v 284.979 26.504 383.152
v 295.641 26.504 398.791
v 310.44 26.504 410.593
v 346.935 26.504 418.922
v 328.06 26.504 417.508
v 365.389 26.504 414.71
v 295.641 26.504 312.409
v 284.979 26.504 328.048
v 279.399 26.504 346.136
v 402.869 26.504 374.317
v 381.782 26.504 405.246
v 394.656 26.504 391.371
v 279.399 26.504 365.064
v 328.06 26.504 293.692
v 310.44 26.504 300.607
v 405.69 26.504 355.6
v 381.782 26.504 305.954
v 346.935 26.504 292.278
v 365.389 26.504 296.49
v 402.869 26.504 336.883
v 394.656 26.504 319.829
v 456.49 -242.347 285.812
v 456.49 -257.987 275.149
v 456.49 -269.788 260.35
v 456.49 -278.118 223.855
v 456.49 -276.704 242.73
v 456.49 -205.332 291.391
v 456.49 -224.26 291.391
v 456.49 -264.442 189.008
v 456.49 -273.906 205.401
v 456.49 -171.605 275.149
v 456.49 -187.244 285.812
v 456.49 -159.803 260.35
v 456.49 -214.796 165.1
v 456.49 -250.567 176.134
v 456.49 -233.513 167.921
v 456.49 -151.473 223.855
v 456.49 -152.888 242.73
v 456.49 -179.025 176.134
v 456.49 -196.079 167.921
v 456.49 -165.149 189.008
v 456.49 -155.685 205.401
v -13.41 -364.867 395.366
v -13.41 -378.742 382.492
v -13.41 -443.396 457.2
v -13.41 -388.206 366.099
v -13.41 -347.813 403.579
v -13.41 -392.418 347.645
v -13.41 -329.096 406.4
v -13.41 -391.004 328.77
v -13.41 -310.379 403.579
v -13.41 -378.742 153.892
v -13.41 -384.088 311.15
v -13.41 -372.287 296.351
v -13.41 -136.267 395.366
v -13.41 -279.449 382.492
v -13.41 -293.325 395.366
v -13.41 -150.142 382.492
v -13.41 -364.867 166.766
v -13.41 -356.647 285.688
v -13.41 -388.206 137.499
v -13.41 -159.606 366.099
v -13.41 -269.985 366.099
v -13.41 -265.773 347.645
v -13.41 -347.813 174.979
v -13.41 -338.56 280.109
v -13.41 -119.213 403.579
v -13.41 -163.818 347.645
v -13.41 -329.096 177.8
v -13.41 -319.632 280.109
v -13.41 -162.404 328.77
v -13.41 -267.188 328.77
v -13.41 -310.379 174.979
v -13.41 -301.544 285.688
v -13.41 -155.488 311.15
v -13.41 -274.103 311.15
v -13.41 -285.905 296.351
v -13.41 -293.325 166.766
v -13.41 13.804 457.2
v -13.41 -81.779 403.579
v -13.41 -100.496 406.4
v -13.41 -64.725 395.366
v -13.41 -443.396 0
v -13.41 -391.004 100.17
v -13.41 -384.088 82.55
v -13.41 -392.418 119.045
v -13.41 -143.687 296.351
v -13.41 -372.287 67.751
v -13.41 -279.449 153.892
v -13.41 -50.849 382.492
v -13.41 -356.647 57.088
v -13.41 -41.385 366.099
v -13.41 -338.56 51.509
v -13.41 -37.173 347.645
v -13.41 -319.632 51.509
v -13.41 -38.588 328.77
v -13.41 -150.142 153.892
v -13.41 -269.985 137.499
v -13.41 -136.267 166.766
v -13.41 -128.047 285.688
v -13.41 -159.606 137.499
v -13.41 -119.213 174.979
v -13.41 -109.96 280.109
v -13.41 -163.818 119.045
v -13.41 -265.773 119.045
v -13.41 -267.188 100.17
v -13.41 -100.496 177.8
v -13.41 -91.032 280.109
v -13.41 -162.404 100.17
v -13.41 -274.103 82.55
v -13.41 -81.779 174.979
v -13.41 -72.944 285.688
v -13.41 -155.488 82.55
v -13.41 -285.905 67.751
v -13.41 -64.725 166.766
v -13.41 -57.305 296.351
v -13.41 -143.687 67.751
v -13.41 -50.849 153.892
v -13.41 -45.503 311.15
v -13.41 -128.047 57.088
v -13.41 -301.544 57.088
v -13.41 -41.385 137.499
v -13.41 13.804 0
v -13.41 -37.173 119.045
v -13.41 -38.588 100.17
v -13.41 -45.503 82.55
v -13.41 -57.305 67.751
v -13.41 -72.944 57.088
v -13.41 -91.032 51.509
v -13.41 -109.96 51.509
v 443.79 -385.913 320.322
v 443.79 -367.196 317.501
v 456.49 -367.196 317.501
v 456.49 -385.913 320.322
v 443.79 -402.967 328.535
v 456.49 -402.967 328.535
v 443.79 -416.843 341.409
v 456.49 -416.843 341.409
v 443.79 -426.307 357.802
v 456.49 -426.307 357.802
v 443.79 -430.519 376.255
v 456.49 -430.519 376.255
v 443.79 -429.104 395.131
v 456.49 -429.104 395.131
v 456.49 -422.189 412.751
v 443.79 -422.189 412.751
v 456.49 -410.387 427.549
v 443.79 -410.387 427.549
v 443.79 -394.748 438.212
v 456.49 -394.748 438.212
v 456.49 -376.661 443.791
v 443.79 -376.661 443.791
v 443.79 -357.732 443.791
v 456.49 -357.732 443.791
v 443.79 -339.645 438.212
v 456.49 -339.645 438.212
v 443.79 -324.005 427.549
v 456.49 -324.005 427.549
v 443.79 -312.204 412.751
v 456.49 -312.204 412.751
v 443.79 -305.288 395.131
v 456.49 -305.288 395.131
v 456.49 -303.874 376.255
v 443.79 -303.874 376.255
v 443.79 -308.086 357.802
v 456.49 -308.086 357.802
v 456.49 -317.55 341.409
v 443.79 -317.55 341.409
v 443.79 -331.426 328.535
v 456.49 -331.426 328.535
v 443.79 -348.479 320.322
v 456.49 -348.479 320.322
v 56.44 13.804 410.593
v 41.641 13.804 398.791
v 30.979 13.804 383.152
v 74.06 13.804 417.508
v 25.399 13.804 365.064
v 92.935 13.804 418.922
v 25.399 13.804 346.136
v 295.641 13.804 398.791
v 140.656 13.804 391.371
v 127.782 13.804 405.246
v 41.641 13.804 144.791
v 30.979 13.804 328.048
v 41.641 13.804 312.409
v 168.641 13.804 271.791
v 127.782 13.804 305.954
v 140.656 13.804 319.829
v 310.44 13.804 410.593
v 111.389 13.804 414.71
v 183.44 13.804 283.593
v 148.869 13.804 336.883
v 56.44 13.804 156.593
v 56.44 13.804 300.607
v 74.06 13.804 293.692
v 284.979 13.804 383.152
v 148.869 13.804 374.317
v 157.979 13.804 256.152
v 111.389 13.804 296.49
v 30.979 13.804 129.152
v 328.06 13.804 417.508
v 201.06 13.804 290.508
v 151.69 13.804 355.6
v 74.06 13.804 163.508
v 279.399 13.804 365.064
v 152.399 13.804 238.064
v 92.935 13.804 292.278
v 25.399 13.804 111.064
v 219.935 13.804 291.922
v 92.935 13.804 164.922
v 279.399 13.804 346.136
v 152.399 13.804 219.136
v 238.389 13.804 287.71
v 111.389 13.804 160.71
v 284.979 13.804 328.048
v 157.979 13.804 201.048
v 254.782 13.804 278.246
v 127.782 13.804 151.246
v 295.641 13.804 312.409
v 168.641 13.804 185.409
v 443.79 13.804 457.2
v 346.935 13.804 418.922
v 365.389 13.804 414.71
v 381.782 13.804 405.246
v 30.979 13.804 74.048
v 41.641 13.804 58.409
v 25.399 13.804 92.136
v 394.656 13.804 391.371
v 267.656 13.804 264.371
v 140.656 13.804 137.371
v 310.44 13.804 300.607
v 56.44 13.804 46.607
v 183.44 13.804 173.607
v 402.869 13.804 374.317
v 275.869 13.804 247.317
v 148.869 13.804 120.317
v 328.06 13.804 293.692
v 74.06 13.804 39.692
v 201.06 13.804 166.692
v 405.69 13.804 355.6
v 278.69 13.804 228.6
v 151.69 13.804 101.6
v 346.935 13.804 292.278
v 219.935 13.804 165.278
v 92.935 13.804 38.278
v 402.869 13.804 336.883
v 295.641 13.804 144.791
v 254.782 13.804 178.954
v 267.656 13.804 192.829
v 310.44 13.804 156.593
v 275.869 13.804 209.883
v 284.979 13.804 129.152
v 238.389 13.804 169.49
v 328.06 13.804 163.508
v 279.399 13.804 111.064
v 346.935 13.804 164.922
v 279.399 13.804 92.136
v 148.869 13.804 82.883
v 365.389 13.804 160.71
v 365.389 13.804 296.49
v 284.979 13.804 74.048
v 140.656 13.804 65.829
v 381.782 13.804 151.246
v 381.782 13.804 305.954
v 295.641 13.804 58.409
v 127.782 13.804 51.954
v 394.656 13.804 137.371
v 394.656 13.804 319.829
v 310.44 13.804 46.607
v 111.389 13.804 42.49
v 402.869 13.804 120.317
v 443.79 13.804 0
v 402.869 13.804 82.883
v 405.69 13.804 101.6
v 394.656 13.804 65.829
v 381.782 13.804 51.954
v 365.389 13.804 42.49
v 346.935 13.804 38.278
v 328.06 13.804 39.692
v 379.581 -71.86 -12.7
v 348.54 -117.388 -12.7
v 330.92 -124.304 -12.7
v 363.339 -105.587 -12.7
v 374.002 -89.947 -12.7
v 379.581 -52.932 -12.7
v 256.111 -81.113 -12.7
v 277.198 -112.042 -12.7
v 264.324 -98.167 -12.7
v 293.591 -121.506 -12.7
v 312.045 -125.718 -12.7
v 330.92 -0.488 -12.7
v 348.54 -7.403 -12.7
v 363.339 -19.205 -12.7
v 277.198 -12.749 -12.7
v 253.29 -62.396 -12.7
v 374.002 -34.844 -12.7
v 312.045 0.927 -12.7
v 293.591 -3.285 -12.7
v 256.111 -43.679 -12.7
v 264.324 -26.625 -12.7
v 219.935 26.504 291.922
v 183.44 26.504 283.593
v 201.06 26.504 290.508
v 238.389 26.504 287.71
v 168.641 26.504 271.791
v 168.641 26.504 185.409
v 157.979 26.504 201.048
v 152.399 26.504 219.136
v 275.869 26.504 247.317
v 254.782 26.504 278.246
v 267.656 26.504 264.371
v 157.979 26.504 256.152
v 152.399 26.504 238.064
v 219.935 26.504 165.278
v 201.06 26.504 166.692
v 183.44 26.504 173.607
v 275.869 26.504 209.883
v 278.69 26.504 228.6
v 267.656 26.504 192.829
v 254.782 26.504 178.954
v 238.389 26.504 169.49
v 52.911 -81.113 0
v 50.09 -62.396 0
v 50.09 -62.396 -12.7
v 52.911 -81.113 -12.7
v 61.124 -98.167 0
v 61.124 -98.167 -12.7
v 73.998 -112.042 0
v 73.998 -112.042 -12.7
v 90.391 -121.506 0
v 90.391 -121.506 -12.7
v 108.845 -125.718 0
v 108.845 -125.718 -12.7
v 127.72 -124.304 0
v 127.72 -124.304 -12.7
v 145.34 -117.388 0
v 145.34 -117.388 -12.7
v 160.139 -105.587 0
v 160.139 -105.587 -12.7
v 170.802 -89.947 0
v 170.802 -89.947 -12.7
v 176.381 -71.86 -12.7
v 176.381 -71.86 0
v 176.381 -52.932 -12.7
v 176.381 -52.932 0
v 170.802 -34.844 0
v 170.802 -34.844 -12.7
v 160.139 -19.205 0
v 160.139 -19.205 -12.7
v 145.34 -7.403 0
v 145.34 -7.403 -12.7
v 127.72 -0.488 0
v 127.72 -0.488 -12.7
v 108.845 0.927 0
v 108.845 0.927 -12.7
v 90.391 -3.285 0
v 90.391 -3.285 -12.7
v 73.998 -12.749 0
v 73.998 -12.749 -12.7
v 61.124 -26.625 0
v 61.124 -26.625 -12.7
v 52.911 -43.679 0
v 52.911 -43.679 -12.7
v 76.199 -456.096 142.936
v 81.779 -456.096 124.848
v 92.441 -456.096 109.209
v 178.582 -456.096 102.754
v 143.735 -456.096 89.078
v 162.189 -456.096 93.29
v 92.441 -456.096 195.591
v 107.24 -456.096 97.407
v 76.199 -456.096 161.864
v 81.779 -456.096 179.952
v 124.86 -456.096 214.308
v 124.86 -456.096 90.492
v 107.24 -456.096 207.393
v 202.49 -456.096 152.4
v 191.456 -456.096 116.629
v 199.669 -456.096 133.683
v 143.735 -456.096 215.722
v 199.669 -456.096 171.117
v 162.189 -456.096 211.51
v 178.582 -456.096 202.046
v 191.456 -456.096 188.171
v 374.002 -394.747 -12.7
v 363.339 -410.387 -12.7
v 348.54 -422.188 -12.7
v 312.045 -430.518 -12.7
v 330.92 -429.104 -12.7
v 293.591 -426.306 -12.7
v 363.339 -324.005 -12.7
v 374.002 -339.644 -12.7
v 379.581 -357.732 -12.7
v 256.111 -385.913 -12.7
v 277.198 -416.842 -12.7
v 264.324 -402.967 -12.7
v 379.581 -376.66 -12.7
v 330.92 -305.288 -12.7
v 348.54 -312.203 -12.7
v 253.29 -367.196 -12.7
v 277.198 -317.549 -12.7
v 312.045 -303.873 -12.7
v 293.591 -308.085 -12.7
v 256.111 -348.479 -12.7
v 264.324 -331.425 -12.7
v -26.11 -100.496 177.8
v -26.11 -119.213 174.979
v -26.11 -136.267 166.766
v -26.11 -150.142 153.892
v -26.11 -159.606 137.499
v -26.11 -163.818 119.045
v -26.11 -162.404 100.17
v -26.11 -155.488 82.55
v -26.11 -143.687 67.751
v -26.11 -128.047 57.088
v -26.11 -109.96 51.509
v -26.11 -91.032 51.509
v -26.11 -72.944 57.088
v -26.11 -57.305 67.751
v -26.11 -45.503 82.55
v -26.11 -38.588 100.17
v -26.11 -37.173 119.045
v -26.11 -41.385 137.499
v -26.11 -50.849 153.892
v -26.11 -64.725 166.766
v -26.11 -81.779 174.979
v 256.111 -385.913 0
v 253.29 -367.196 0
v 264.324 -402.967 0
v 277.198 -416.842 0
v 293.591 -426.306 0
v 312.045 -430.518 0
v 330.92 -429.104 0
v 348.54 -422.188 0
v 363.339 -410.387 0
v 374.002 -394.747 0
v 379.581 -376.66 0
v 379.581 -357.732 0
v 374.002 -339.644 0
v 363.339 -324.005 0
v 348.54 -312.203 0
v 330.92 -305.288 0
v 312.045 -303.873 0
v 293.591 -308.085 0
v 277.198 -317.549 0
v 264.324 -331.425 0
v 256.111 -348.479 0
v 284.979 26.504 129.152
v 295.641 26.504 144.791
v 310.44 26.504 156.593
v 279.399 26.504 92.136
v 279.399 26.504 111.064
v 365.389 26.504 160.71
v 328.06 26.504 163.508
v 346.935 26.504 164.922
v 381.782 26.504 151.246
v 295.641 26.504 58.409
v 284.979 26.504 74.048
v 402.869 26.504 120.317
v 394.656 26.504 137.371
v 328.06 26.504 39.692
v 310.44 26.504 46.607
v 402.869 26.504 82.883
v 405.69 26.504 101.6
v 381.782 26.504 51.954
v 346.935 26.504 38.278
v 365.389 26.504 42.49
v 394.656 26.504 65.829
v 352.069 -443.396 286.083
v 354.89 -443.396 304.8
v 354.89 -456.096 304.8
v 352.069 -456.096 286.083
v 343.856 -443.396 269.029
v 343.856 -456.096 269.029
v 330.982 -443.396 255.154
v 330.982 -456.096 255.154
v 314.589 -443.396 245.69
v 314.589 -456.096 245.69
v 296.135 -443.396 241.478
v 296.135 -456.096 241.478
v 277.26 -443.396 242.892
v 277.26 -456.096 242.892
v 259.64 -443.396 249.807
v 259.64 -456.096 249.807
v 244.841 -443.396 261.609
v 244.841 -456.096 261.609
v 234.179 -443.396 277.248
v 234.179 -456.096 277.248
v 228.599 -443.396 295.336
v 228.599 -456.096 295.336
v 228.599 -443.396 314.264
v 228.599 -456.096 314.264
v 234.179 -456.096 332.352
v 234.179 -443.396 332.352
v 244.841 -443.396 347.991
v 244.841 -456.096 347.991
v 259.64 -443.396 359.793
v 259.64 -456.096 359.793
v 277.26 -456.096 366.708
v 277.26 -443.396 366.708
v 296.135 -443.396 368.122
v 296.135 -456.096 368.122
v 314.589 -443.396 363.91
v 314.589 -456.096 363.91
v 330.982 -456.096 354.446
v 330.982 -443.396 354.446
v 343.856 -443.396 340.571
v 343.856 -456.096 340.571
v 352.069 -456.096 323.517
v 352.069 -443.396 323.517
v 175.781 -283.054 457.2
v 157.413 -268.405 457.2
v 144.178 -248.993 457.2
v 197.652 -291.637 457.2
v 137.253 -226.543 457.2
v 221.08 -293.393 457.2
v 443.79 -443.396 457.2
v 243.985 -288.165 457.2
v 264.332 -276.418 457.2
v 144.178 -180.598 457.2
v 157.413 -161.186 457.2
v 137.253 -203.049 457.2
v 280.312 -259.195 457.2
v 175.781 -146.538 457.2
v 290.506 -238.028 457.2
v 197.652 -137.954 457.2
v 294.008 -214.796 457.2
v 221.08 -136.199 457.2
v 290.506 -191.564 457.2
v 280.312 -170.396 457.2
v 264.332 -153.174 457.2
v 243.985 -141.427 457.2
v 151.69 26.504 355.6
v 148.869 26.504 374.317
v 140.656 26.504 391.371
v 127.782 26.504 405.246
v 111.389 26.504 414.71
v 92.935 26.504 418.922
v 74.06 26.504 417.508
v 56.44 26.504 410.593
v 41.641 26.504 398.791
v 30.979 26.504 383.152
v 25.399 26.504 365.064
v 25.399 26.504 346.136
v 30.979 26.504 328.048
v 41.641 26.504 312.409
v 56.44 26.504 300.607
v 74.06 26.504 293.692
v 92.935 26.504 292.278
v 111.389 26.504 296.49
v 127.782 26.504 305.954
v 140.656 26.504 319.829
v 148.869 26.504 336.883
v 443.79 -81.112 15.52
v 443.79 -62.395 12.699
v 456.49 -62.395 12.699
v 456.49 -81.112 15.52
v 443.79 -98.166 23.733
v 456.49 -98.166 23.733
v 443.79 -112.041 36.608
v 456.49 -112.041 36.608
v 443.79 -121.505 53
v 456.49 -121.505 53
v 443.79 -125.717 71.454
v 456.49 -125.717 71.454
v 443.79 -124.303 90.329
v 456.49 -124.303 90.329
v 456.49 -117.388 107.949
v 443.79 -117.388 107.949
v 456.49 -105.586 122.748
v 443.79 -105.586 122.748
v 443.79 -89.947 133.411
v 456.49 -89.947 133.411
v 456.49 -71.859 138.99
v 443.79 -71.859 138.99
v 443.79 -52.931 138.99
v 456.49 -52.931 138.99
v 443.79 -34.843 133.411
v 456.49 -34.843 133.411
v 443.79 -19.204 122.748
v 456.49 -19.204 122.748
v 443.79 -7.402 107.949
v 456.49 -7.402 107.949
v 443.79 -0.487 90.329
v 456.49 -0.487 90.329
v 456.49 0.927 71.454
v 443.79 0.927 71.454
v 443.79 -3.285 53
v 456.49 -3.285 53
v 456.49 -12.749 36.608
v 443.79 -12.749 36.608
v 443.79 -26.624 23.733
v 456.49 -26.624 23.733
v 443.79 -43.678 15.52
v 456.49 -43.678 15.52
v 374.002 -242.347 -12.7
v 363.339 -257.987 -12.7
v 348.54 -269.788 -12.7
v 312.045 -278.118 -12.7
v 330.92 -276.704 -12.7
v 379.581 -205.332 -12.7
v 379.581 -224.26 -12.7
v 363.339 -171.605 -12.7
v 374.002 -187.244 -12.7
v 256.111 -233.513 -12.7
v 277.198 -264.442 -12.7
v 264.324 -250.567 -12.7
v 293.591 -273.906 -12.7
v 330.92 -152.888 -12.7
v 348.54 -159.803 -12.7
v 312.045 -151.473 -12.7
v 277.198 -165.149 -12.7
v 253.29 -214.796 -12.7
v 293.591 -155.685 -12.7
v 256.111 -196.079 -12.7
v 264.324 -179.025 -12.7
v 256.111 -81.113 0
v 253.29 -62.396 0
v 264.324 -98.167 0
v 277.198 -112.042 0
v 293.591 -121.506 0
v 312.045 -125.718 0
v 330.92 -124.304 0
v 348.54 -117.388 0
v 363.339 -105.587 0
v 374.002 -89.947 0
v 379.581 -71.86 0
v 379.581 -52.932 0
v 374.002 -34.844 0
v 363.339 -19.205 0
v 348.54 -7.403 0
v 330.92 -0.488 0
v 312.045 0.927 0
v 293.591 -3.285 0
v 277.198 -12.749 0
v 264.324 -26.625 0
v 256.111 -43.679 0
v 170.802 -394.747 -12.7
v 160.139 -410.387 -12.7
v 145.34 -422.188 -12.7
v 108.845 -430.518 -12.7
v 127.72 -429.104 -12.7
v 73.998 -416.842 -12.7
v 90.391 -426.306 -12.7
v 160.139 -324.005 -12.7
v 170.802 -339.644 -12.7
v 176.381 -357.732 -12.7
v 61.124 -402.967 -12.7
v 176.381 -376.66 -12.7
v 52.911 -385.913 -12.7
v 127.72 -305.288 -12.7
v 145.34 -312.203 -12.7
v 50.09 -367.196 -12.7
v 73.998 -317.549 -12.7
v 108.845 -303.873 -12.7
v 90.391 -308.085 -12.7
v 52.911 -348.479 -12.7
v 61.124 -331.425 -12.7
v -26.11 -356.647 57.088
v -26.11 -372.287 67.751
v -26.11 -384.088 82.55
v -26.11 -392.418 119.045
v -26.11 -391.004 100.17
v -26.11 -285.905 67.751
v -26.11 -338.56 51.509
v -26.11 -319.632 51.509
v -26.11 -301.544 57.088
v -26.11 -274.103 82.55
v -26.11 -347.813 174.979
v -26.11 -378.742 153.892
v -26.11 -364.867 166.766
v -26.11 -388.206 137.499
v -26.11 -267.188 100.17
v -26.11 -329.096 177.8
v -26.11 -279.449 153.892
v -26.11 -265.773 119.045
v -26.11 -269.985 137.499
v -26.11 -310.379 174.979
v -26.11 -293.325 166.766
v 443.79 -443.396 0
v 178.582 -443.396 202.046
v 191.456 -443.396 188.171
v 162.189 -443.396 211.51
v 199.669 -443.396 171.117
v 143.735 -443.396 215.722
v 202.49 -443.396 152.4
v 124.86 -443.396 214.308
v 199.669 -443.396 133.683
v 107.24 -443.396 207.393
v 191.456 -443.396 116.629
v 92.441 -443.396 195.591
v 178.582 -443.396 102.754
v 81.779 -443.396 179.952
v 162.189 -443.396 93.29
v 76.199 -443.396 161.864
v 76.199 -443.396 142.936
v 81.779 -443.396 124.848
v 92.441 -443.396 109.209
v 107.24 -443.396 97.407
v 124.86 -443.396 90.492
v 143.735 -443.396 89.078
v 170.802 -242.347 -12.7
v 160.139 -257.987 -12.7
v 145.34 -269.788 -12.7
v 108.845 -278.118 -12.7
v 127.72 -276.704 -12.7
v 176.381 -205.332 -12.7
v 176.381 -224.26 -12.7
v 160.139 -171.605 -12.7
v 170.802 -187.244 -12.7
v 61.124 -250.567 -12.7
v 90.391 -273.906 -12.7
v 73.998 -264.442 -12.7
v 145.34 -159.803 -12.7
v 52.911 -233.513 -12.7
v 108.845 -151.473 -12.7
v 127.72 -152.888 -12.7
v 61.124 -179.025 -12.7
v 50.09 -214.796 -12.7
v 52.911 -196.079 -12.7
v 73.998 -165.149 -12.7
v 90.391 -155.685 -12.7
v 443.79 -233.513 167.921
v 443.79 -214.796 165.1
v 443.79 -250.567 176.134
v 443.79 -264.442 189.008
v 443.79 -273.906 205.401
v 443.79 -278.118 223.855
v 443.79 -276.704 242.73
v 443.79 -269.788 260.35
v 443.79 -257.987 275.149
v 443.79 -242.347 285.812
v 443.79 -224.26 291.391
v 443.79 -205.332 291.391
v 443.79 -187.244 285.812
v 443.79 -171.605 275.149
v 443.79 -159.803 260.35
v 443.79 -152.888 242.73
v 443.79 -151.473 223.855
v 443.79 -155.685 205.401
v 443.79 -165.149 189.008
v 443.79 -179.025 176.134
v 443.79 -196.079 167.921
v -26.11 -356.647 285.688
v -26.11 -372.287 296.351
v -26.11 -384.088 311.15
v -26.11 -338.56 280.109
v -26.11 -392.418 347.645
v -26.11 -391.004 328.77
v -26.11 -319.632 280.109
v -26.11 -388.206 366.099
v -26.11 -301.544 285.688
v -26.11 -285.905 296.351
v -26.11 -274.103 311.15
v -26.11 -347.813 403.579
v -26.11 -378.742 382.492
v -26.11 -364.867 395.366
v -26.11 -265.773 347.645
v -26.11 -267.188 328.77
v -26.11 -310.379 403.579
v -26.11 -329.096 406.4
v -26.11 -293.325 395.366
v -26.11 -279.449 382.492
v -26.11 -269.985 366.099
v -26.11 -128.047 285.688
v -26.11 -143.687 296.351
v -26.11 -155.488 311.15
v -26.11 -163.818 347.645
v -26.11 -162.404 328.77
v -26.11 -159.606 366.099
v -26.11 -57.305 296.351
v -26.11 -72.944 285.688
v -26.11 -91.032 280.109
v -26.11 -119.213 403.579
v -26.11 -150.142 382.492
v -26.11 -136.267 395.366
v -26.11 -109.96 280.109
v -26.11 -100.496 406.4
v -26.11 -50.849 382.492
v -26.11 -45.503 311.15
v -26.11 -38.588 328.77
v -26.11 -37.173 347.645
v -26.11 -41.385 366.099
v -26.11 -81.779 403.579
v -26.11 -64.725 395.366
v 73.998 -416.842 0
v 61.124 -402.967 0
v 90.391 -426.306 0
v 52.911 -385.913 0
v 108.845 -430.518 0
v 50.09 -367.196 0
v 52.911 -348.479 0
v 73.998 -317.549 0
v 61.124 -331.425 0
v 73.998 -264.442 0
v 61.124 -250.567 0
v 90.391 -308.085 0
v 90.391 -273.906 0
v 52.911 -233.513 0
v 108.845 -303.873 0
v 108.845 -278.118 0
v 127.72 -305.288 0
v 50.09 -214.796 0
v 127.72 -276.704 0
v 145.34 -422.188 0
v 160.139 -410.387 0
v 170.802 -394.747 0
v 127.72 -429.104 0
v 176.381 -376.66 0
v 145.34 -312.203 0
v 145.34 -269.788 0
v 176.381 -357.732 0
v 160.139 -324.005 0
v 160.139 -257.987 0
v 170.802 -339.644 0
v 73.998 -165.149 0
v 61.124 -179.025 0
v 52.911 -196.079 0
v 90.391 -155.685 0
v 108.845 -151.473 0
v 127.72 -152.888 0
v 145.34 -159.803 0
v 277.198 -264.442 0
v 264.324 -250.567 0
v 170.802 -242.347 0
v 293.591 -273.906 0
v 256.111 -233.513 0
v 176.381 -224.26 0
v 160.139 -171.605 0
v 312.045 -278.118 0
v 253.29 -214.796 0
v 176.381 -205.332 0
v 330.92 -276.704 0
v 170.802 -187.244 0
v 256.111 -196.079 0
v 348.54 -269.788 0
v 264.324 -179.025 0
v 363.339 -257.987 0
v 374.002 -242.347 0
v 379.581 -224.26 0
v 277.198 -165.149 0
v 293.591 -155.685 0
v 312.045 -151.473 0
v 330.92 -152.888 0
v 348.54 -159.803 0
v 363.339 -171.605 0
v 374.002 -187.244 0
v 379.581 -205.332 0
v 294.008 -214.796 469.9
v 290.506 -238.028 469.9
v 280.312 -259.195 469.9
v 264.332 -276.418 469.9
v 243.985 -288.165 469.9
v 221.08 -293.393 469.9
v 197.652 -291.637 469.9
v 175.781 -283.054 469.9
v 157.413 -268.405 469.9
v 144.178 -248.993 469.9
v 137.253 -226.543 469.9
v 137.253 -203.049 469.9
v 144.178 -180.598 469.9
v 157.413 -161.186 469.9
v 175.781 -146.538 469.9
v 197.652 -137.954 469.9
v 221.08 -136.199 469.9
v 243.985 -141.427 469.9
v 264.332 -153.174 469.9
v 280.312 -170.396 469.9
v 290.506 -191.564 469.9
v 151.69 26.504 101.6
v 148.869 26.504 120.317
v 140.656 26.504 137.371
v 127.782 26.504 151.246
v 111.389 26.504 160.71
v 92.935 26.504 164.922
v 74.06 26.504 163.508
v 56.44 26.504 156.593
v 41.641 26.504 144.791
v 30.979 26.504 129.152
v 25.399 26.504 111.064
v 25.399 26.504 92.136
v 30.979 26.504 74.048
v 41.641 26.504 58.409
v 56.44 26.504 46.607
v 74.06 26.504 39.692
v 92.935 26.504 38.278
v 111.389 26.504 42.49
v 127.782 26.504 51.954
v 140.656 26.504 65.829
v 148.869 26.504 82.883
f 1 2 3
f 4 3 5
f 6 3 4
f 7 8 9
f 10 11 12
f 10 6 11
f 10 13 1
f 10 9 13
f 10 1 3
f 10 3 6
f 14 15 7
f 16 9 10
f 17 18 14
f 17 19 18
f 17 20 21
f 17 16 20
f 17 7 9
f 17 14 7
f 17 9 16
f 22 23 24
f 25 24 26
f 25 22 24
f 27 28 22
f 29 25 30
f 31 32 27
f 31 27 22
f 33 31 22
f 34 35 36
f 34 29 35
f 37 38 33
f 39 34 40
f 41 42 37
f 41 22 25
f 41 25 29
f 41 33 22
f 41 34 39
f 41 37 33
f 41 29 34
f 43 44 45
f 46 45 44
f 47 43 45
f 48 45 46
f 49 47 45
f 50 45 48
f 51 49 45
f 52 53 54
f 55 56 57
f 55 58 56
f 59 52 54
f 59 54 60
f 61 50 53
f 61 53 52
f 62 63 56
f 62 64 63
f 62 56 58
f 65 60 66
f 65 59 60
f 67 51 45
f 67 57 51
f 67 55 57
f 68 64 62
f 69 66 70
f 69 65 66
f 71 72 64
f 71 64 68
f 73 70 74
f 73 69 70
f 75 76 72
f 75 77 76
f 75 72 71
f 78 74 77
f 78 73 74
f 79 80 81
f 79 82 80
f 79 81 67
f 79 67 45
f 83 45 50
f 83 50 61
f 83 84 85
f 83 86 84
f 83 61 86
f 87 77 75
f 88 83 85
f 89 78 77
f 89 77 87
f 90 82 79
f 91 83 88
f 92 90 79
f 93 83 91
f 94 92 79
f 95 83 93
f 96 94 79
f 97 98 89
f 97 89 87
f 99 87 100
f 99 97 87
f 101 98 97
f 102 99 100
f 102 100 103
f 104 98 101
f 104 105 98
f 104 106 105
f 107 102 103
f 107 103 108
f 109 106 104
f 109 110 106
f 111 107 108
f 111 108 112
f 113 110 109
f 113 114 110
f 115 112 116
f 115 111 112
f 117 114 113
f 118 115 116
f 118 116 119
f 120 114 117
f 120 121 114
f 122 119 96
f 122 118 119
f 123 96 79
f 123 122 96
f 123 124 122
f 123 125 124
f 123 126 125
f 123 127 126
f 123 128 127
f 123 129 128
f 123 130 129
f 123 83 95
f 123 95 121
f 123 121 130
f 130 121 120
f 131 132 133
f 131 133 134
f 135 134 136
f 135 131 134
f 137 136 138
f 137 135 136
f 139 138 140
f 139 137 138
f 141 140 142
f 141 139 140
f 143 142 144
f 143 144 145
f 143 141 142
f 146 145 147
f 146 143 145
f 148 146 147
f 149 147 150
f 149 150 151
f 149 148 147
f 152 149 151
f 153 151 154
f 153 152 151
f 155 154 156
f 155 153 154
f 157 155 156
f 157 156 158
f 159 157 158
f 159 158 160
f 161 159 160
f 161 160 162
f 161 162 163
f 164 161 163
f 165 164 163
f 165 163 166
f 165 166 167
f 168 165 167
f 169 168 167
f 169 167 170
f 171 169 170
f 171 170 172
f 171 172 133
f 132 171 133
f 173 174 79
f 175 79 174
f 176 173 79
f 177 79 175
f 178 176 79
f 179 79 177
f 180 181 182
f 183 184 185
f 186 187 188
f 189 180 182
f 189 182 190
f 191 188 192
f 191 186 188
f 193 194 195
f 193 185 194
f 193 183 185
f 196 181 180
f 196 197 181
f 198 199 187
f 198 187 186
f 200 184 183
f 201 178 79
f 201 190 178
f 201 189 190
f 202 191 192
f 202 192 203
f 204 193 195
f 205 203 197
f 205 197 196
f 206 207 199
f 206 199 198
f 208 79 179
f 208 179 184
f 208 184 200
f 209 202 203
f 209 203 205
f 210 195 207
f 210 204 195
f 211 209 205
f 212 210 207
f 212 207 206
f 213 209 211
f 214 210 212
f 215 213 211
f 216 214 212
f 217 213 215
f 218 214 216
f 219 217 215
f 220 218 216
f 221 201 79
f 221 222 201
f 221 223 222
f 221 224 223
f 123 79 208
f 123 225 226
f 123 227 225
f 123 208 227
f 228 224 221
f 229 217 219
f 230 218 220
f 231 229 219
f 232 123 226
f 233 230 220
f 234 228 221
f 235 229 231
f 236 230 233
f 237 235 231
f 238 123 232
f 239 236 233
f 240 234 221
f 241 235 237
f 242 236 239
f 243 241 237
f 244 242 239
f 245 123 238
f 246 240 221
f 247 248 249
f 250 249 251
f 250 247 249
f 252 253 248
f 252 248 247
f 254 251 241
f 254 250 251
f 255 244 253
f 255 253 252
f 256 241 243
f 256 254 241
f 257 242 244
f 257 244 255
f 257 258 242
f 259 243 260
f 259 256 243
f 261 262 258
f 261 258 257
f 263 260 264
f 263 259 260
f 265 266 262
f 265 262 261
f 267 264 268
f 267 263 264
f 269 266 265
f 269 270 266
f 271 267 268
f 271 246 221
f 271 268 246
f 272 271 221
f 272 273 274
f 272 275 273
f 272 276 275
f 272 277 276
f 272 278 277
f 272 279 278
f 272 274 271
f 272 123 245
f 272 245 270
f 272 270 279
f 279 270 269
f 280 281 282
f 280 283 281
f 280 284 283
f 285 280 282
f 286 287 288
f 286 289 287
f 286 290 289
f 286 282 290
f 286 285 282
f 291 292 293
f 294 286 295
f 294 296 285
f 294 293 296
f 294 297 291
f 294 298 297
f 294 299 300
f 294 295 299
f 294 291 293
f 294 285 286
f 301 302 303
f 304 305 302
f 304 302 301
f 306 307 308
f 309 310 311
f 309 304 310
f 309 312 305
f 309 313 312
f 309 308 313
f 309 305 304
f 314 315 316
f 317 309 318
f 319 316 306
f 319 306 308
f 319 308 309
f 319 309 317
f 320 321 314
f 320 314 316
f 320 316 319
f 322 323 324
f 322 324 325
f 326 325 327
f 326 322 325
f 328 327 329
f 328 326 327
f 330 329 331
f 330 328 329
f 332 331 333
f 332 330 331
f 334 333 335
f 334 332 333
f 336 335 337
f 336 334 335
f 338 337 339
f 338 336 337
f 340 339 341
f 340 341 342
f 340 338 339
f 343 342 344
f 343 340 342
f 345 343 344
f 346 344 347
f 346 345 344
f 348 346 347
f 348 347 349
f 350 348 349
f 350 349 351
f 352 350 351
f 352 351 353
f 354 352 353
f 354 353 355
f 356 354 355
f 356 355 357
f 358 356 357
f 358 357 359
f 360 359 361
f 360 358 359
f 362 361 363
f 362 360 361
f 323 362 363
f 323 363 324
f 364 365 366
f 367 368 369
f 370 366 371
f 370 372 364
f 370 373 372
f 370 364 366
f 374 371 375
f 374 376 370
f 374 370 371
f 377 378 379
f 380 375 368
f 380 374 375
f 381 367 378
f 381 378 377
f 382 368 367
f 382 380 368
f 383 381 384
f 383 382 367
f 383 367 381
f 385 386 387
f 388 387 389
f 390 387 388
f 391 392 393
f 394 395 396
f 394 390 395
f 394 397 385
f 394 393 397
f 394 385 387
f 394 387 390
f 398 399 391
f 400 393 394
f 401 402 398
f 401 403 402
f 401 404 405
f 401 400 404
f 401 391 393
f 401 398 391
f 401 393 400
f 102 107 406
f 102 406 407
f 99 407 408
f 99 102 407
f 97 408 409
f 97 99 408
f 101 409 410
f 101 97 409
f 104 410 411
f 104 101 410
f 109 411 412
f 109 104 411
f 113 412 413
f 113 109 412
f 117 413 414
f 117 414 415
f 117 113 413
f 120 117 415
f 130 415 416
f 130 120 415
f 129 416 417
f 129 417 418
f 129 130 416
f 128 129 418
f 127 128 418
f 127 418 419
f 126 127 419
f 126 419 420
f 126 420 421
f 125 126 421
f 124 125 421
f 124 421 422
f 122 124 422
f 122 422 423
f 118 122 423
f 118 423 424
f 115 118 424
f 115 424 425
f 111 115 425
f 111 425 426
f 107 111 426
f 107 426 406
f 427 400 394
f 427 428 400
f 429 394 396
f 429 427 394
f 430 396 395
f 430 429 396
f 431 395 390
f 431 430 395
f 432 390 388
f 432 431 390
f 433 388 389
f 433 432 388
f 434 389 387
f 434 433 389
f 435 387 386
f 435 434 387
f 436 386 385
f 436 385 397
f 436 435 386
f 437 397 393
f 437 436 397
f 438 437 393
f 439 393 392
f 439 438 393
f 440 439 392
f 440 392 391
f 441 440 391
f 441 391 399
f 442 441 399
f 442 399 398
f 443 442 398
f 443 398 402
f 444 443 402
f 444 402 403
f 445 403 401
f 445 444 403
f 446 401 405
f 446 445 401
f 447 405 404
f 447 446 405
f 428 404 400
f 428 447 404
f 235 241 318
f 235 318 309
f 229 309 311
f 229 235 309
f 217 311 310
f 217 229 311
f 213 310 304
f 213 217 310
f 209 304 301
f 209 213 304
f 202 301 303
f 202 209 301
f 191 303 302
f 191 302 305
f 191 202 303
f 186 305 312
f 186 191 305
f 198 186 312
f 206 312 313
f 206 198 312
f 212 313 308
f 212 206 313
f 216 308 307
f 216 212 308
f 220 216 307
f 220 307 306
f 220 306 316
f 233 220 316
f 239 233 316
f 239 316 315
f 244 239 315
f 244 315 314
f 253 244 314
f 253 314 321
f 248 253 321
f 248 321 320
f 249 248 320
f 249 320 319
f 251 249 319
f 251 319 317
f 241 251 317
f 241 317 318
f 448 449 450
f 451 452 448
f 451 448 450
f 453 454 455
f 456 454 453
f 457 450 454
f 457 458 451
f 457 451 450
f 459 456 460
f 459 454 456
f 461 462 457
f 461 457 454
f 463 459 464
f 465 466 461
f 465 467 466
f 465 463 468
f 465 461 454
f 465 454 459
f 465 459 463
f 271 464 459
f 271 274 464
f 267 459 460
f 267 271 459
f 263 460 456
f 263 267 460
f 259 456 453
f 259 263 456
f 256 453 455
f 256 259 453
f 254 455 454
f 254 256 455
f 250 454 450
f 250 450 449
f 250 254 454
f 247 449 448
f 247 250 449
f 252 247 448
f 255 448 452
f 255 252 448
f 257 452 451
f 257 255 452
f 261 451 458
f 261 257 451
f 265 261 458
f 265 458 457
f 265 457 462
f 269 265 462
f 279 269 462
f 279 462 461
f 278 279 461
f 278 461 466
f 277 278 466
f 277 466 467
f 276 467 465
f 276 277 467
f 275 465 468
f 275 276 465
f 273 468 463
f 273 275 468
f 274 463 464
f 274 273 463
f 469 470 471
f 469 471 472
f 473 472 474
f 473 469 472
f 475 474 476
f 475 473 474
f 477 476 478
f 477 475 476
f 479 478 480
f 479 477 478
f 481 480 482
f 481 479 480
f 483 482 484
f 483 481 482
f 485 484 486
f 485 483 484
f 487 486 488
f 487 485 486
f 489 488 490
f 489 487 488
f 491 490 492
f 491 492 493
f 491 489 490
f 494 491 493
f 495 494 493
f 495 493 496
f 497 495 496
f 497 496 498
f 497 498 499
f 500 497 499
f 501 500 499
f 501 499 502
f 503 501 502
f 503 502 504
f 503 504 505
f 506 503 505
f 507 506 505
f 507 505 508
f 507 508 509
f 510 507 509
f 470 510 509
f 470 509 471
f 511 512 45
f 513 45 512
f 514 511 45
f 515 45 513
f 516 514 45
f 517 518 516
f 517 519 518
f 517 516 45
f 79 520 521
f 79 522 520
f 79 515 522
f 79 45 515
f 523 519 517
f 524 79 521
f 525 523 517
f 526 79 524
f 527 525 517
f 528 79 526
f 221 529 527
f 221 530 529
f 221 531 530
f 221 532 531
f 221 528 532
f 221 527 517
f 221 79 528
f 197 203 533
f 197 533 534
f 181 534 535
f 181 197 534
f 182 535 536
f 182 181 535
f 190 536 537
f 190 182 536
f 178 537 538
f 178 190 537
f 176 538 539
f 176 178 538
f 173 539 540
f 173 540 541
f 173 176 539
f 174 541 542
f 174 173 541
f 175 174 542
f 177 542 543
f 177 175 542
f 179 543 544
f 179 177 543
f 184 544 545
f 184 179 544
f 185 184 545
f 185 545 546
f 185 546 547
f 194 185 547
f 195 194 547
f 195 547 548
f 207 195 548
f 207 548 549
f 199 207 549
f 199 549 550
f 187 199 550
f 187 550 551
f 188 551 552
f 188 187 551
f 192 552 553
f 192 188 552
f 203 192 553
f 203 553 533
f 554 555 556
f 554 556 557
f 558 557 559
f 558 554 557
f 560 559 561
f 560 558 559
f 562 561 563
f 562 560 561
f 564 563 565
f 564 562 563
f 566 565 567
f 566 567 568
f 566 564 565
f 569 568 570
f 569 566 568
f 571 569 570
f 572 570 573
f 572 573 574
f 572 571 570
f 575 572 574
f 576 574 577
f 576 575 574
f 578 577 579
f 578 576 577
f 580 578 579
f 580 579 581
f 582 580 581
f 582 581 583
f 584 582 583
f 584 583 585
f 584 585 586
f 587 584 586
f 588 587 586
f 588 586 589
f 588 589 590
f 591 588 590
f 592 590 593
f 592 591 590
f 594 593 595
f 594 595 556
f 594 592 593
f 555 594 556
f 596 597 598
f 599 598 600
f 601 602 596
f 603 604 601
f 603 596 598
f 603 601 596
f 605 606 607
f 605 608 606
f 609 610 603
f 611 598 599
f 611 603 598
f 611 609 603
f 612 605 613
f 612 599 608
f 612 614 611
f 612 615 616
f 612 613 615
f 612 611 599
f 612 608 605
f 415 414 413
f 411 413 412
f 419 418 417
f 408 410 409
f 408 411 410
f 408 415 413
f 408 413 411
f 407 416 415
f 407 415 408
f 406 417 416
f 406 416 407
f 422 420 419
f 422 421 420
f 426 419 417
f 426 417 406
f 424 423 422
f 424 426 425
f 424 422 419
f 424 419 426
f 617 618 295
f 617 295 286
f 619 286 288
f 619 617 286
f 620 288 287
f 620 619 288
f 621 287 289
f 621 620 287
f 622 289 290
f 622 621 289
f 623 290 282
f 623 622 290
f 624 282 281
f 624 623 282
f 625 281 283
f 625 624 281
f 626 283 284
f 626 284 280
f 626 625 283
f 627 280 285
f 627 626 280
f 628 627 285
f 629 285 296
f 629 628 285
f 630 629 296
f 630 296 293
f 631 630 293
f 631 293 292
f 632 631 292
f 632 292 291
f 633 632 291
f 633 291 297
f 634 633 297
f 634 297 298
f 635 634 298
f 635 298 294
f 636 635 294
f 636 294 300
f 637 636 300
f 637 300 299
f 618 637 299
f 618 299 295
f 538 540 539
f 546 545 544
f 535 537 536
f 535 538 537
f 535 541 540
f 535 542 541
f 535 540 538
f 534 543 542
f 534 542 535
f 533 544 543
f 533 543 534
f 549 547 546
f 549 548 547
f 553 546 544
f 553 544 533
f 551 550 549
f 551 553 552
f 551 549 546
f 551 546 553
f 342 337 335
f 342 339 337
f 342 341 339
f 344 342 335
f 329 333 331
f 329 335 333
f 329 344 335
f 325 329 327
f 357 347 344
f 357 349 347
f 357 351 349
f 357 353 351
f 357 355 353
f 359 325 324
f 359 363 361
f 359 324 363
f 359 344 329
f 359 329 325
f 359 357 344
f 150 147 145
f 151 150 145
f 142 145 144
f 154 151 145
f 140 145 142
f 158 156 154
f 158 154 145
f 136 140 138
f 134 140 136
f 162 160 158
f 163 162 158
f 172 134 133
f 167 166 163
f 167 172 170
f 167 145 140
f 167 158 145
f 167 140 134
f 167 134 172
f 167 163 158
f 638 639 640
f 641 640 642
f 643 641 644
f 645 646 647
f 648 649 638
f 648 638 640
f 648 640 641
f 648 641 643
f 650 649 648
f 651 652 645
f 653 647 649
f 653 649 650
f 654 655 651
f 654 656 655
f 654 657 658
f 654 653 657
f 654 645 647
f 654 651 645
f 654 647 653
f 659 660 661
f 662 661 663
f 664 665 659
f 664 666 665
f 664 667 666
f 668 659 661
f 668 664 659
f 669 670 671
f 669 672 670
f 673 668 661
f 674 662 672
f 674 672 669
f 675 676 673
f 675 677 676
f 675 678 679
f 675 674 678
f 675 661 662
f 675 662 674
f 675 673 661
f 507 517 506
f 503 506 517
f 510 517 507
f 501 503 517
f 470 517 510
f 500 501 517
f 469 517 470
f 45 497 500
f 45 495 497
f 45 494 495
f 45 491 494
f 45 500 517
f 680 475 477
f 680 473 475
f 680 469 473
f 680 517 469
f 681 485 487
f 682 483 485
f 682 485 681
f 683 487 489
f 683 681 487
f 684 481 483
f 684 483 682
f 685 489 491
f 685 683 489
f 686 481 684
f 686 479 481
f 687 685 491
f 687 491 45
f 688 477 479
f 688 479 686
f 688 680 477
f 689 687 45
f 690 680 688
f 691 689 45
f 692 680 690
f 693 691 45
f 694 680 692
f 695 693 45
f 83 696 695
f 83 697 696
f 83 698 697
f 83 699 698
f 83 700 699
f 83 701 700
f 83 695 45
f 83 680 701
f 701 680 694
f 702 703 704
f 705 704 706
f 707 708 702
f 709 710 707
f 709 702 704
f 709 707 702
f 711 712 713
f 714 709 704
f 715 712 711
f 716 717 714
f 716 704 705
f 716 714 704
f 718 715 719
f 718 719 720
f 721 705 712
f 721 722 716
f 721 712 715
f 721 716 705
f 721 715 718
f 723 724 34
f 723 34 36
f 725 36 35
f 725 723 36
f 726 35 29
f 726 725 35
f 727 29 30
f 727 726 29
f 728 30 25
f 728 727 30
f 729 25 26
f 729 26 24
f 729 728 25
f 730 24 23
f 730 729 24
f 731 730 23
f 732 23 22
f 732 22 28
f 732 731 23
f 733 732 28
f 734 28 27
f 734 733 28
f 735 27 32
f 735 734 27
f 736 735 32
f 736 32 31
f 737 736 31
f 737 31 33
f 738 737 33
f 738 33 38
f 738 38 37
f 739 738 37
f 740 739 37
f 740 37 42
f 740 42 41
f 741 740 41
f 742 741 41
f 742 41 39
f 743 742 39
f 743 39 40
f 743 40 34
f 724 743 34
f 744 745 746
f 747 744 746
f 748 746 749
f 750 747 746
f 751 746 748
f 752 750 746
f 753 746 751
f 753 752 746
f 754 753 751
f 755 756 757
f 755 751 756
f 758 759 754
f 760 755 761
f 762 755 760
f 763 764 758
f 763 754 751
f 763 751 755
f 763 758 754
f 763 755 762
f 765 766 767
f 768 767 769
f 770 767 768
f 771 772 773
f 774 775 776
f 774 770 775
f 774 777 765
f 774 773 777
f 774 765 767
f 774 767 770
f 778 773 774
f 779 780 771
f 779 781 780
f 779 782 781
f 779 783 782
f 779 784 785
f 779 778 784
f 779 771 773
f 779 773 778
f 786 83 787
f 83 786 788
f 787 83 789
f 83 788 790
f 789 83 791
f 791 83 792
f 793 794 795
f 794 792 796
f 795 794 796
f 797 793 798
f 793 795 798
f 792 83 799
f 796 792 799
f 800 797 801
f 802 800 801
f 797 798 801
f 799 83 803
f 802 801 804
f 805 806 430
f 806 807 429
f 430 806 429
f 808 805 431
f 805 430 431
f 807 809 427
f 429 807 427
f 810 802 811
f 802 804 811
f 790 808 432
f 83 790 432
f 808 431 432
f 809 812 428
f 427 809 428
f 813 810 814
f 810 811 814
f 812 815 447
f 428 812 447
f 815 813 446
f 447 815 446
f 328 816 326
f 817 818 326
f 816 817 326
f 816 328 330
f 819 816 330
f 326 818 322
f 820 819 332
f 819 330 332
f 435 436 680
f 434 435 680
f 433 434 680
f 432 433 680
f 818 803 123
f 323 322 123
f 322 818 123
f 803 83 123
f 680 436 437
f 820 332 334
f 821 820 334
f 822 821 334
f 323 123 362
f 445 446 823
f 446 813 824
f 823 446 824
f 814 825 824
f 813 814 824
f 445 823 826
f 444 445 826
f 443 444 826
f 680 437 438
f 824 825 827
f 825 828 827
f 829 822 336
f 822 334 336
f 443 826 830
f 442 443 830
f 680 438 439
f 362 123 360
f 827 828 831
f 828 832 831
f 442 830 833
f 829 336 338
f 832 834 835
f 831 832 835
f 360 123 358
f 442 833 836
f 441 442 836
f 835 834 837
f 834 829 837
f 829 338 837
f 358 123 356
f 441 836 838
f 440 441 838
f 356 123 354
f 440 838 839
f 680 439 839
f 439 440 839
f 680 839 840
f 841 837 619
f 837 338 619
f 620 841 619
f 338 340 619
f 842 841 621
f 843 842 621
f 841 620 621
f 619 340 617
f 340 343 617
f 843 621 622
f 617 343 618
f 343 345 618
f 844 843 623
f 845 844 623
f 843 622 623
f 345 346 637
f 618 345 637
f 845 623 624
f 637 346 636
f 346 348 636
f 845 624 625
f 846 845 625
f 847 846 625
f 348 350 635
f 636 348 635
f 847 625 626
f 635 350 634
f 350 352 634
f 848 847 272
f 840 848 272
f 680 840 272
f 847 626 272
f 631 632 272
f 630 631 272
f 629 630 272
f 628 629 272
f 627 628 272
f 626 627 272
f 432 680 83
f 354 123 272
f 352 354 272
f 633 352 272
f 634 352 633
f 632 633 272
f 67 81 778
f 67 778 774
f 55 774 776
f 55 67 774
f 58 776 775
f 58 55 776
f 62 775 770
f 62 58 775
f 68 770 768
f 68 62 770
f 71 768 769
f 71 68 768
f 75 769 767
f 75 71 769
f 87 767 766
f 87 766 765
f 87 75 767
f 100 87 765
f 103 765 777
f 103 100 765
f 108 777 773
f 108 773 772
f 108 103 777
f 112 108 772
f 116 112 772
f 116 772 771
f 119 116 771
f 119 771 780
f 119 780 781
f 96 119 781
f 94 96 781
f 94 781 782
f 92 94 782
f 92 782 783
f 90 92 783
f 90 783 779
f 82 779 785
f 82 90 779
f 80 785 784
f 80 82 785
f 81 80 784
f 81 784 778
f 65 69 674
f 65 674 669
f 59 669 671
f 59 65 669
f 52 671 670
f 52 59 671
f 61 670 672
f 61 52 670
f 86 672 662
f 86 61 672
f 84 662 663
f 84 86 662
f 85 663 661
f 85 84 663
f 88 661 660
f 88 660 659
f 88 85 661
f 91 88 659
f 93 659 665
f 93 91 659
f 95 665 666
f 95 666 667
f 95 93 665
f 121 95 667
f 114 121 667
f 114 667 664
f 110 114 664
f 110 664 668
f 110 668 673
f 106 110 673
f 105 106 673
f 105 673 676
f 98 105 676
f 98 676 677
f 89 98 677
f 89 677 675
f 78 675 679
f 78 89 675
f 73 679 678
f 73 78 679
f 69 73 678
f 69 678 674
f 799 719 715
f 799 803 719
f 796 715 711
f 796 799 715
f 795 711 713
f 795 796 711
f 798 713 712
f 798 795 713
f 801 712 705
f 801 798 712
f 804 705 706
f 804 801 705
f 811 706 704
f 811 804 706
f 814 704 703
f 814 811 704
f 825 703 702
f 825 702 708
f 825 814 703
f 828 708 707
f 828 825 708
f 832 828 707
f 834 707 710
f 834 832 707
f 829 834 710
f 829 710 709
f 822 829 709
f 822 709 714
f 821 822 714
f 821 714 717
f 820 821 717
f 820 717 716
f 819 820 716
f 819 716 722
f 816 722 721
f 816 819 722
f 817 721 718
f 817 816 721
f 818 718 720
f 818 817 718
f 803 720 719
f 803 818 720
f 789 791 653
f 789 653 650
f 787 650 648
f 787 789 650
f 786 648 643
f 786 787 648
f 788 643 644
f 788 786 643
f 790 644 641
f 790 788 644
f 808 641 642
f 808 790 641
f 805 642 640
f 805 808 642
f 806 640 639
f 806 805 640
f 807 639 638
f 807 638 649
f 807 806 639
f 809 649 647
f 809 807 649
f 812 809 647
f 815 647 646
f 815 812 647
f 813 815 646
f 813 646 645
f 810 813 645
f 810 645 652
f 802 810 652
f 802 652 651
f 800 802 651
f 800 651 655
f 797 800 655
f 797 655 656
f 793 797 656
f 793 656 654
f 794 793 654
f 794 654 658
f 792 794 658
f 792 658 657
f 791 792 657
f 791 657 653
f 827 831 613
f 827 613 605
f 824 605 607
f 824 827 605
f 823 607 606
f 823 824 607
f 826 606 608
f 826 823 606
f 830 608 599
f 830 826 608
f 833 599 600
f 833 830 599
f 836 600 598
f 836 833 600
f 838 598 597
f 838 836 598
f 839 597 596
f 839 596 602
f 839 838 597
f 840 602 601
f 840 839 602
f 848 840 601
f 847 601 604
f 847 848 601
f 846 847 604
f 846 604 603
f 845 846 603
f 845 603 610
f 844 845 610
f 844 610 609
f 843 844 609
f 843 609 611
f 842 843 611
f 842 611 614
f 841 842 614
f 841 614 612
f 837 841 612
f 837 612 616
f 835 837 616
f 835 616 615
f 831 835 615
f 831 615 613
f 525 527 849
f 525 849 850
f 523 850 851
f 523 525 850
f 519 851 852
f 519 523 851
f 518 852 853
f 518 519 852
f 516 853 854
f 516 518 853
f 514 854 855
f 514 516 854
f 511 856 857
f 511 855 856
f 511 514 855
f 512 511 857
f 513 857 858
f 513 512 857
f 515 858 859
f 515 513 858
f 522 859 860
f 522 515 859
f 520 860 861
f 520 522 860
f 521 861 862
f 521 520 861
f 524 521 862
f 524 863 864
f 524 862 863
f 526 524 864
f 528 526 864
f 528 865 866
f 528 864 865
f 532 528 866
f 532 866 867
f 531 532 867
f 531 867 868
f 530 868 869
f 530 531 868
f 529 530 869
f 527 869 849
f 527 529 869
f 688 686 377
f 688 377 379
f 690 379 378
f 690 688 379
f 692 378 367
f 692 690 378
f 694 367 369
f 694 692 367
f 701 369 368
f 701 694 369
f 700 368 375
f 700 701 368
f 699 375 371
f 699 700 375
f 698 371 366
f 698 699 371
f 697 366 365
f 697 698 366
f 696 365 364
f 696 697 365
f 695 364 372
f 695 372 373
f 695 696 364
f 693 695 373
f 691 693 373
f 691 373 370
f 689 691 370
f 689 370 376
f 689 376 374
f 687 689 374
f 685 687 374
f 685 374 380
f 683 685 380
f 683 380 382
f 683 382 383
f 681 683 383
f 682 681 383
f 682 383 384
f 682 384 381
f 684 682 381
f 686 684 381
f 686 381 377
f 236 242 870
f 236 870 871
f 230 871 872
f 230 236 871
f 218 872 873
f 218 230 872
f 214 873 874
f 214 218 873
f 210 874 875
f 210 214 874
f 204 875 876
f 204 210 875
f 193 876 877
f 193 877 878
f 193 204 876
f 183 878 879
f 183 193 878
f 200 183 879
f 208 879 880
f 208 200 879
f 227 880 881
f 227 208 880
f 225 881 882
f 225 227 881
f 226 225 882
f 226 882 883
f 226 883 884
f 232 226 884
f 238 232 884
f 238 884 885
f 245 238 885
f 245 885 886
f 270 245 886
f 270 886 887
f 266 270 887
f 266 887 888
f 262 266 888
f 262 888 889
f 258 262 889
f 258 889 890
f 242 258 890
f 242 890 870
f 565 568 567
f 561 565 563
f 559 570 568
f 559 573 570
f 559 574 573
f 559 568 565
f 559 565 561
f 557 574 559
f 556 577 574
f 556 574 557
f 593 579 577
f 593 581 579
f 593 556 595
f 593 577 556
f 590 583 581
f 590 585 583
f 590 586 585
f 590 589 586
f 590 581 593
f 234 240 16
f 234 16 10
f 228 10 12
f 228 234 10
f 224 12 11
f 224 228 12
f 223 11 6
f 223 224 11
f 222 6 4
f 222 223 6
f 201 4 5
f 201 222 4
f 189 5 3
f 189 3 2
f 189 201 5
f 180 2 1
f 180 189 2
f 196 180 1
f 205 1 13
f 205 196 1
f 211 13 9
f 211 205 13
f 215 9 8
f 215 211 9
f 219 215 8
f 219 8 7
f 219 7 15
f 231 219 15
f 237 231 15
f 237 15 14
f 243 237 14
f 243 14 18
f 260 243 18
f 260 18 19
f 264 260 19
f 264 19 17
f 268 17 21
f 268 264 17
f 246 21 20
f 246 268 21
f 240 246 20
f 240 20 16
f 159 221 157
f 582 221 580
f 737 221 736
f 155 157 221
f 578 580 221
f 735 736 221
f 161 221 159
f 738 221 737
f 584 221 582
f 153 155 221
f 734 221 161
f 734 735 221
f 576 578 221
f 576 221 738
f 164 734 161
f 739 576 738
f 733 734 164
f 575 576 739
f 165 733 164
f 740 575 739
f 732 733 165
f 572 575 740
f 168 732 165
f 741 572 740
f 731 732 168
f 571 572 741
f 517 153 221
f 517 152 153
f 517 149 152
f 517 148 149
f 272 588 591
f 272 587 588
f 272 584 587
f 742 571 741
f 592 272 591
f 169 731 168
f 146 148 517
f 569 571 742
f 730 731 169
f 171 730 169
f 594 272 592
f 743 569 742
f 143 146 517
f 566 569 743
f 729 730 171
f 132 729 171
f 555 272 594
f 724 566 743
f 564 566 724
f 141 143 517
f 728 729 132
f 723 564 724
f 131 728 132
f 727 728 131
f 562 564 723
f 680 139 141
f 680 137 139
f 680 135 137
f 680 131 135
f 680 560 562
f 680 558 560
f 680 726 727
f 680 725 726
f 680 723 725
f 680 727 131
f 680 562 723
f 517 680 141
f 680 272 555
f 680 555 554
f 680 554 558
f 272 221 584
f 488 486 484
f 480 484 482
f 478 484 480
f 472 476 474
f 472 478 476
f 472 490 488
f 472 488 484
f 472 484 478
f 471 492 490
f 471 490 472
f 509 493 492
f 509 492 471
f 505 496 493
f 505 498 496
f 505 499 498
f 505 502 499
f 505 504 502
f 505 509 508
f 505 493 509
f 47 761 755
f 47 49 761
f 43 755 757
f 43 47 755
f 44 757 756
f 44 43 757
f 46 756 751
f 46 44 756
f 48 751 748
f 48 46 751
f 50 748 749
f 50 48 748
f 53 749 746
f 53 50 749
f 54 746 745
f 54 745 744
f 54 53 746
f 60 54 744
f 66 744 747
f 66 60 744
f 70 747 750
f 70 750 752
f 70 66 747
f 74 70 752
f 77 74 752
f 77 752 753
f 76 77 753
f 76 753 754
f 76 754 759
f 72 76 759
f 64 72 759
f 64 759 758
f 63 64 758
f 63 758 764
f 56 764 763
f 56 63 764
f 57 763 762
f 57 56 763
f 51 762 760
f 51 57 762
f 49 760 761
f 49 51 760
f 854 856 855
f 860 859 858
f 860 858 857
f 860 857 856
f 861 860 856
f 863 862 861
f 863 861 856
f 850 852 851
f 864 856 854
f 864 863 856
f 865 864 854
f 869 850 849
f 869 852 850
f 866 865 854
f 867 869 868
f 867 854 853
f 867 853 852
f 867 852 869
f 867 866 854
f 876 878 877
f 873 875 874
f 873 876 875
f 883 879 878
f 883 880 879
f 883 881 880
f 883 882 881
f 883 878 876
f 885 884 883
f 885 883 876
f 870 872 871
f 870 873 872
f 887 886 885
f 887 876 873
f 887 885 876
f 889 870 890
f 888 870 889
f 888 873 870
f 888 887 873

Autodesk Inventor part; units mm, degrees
ref_plane "YZ Plane" through (0, 0, 0) normal (1, 0, 0) x (0, 1, 0)
ref_plane "XZ Plane" through (0, 0, 0) normal (0, 1, 0) x (-1, 0, 0)
sketch "Sketch1" plane through (0, 0, 0) normal (0, 0, 1) x (1, 0, 0)
  line L0 (-13.4099, 13.8043) -> (443.7901, 13.8043)
  line L1 (443.7901, 13.8043) -> (443.7901, -443.3957)
  line L2 (443.7901, -443.3957) -> (-13.4099, -443.3957)
  line L3 (-13.4099, -443.3957) -> (-13.4099, 13.8043)
  point P0 (0, 0)
  dimension "d0" = 457.2
  dimension "d1" = 457.2
extrude "Extrusion1" add sketch "Sketch1" along normal blind 457.2
ref_plane "Work Plane1" through (443.7901, 0, 457.2) normal (-0.7071, 0, 0.7071) x (0, -1, 0)
sketch "Sketch2" plane through (0, 0, 457.2) normal (0, 0, 1) x (1, 0, 0)
  point P0 (0, 0)
sketch "Sketch3" plane through (0, 0, 457.2) normal (0, 0, 1) x (1, 0, 0)
  circle A0 centre (215.1901, -214.7957) radius 78.8174
  line L0 (443.7901, -443.3957) -> (443.7901, 13.8043) projected
  line L1 (443.7901, 13.8043) -> (-13.4099, 13.8043) projected
  point P0 (0, 0)
  dimension "d4" = 228.6
  dimension "d5" = 228.6
extrude "Extrusion2" add sketch "Sketch3" along normal blind 12.7
sketch "Sketch4" plane through (443.7901, -443.3957, 0) normal (1, 0, 0) x (0, 0, -1)
  point P0 (0, 443.3957)
sketch "Sketch5" plane through (443.7901, -443.3957, 0) normal (1, 0, 0) x (0, 0, -1)
  line L0 (0, 457.2) -> (-457.2, 0)
  circle A0 centre (-76.1993, 381.0007) radius 63.5
  circle A1 centre (-228.6, 228.6) radius 63.5
  circle A2 centre (-381.0007, 76.1993) radius 63.5
  point P0 (0, 443.3957)
  dimension "d21" = 127
  dimension "d22" = 127
  dimension "d23" = 127
  dimension "d25" = 646.5784
  dimension "d26" = 107.762
  dimension "d28" = 107.762
extrude "Extrusion3" add sketch "Sketch5" along normal blind 12.7
sketch "Sketch6" plane through (-13.4099, -443.3957, 0) normal (-1, 0, 0) x (0, 0, 1)
  line L0 (0, 457.2) -> (457.2, 0)
  line L1 (114.3, 342.9) -> (342.9, 342.9)
  line L2 (342.9, 342.9) -> (342.9, 114.3)
  line L3 (342.9, 114.3) -> (114.3, 114.3)
  line L4 (114.3, 114.3) -> (114.3, 342.9)
  line L5 (0, 0) -> (0, 457.2) projected
  line L6 (457.2, 457.2) -> (457.2, 0) projected
  circle A0 centre (114.3, 342.9) radius 63.5
  circle A1 centre (342.9, 342.9) radius 63.5
  circle A2 centre (114.3, 114.3) radius 63.5
  circle A3 centre (342.9, 114.3) radius 63.5
  point P0 (228.6, 228.6)
  dimension "d37" = 228.6
  dimension "d38" = 114.3
  dimension "d40" = 127
  dimension "d41" = 127
  dimension "d42" = 127
  dimension "d43" = 127
extrude "Extrusion4" add sketch "Sketch6" along normal blind 12.7 contours A0 L1 L0 | L0 L4 A0 | L1 A0 L0 | L0 A0 L4 | A1 L2 L1 | L1 L2 A1 | A2 L3 L4 | L4 L3 A2 | A3 L2 L0 | L0 L3 A3 | L2 A3 L0 | L0 A3 L3
sketch "Sketch7" plane through (0, 0, 0) normal (0, 0, -1) x (-1, 0, 0)
  line L0 (-443.7901, 13.8043) -> (-316.7901, 13.8043)
  line L1 (-443.7901, 13.8043) -> (13.4099, 13.8043) projected
  line L2 (13.4099, 13.8043) -> (-113.5901, 13.8043)
  line L3 (-443.7901, -443.3957) -> (13.4099, -443.3957) projected
  line L4 (-316.7901, 13.8043) -> (-316.7901, -443.3957)
  line L5 (-113.5901, 13.8043) -> (-113.5901, -443.3957)
  line L6 (-316.7901, 13.8043) -> (-316.7901, -62.3957)
  line L7 (-316.7901, -443.3957) -> (-316.7901, -367.1957)
  circle A0 centre (-316.7901, -62.3957) radius 63.5
  circle A1 centre (-316.7901, -367.1957) radius 63.5
  circle A2 centre (-316.7901, -214.7957) radius 63.5
  circle A3 centre (-113.5901, -62.3957) radius 63.5
  circle A4 centre (-113.5901, -214.7957) radius 63.5
  circle A5 centre (-113.5901, -367.1957) radius 63.5
  point P0 (0, 0)
  dimension "d46" = 127
  dimension "d47" = 127
  dimension "d53" = 76.2
  dimension "d54" = 76.2
  dimension "d55" = 127
  dimension "d56" = 127
  dimension "d57" = 127
  dimension "d58" = 127
  dimension "d59" = 127
  dimension "d60" = 127
extrude "Extrusion5" add sketch "Sketch7" along normal blind 12.7 contours A0 L4 | L4 A0 | A3 L5 | L5 A3 | A2 L4 | L4 A2 | A4 L5 | L5 A4 | A1 L4 | L4 A1 | A5 L5 | L5 A5
sketch "Sketch8" plane through (-13.4099, 13.8043, 0) normal (0, 1, 0) x (1, 0, 0)
  line L0 (355.6, -101.6) -> (101.6, -101.6)
  line L1 (101.6, -101.6) -> (101.6, -355.6)
  line L2 (101.6, -355.6) -> (355.6, -355.6)
  line L3 (355.6, -355.6) -> (355.6, -101.6)
  line L4 (355.6, -101.6) -> (101.6, -355.6)
  circle A0 centre (355.6, -101.6) radius 63.5
  line L5 (0, 0) -> (457.2, 0) projected
  line L6 (457.2, -457.2) -> (0, -457.2) projected
  line L7 (457.2, 0) -> (457.2, -457.2) projected
  circle A1 centre (228.6, -228.6) radius 63.5
  circle A2 centre (101.6, -101.6) radius 63.5
  circle A3 centre (101.6, -355.6) radius 63.5
  circle A4 centre (355.6, -355.6) radius 63.5
  point P0 (13.4099, 0)
  dimension "d63" = 254
  dimension "d64" = 101.6
  dimension "d65" = 101.6
  dimension "d66" = 101.6
  dimension "d67" = 127
  dimension "d68" = 127
  dimension "d69" = 127
  dimension "d70" = 127
  dimension "d71" = 127
extrude "Extrusion6" add sketch "Sketch8" along normal blind 12.7 contours A2 L1 L0 | L0 L1 A2 | A0 L3 L0 | L0 L4 A0 | L3 A0 L4 | A3 L4 L1 | L1 L2 A3 | A1 L4 | L4 A1 | L4 A3 L2 | A4 L2 L3 | L3 L2 A4
sketch "Sketch9" plane through (-13.4099, -443.3957, 0) normal (0, -1, 0) x (1, 0, 0)
  line L0 (0, 0) -> (457.2, 457.2)
  line L1 (457.2, 457.2) -> (304.8, 304.8)
  line L2 (0, 0) -> (152.4, 152.4)
  circle A0 centre (152.4, 152.4) radius 63.5
  circle A1 centre (304.8, 304.8) radius 63.5
  point P0 (13.4099, 0)
  dimension "d77" = 646.5784
  dimension "d78" = 127
  dimension "d79" = 127
extrude "Extrusion7" add sketch "Sketch9" along normal blind 12.7
properties part number "dicemodel1"
